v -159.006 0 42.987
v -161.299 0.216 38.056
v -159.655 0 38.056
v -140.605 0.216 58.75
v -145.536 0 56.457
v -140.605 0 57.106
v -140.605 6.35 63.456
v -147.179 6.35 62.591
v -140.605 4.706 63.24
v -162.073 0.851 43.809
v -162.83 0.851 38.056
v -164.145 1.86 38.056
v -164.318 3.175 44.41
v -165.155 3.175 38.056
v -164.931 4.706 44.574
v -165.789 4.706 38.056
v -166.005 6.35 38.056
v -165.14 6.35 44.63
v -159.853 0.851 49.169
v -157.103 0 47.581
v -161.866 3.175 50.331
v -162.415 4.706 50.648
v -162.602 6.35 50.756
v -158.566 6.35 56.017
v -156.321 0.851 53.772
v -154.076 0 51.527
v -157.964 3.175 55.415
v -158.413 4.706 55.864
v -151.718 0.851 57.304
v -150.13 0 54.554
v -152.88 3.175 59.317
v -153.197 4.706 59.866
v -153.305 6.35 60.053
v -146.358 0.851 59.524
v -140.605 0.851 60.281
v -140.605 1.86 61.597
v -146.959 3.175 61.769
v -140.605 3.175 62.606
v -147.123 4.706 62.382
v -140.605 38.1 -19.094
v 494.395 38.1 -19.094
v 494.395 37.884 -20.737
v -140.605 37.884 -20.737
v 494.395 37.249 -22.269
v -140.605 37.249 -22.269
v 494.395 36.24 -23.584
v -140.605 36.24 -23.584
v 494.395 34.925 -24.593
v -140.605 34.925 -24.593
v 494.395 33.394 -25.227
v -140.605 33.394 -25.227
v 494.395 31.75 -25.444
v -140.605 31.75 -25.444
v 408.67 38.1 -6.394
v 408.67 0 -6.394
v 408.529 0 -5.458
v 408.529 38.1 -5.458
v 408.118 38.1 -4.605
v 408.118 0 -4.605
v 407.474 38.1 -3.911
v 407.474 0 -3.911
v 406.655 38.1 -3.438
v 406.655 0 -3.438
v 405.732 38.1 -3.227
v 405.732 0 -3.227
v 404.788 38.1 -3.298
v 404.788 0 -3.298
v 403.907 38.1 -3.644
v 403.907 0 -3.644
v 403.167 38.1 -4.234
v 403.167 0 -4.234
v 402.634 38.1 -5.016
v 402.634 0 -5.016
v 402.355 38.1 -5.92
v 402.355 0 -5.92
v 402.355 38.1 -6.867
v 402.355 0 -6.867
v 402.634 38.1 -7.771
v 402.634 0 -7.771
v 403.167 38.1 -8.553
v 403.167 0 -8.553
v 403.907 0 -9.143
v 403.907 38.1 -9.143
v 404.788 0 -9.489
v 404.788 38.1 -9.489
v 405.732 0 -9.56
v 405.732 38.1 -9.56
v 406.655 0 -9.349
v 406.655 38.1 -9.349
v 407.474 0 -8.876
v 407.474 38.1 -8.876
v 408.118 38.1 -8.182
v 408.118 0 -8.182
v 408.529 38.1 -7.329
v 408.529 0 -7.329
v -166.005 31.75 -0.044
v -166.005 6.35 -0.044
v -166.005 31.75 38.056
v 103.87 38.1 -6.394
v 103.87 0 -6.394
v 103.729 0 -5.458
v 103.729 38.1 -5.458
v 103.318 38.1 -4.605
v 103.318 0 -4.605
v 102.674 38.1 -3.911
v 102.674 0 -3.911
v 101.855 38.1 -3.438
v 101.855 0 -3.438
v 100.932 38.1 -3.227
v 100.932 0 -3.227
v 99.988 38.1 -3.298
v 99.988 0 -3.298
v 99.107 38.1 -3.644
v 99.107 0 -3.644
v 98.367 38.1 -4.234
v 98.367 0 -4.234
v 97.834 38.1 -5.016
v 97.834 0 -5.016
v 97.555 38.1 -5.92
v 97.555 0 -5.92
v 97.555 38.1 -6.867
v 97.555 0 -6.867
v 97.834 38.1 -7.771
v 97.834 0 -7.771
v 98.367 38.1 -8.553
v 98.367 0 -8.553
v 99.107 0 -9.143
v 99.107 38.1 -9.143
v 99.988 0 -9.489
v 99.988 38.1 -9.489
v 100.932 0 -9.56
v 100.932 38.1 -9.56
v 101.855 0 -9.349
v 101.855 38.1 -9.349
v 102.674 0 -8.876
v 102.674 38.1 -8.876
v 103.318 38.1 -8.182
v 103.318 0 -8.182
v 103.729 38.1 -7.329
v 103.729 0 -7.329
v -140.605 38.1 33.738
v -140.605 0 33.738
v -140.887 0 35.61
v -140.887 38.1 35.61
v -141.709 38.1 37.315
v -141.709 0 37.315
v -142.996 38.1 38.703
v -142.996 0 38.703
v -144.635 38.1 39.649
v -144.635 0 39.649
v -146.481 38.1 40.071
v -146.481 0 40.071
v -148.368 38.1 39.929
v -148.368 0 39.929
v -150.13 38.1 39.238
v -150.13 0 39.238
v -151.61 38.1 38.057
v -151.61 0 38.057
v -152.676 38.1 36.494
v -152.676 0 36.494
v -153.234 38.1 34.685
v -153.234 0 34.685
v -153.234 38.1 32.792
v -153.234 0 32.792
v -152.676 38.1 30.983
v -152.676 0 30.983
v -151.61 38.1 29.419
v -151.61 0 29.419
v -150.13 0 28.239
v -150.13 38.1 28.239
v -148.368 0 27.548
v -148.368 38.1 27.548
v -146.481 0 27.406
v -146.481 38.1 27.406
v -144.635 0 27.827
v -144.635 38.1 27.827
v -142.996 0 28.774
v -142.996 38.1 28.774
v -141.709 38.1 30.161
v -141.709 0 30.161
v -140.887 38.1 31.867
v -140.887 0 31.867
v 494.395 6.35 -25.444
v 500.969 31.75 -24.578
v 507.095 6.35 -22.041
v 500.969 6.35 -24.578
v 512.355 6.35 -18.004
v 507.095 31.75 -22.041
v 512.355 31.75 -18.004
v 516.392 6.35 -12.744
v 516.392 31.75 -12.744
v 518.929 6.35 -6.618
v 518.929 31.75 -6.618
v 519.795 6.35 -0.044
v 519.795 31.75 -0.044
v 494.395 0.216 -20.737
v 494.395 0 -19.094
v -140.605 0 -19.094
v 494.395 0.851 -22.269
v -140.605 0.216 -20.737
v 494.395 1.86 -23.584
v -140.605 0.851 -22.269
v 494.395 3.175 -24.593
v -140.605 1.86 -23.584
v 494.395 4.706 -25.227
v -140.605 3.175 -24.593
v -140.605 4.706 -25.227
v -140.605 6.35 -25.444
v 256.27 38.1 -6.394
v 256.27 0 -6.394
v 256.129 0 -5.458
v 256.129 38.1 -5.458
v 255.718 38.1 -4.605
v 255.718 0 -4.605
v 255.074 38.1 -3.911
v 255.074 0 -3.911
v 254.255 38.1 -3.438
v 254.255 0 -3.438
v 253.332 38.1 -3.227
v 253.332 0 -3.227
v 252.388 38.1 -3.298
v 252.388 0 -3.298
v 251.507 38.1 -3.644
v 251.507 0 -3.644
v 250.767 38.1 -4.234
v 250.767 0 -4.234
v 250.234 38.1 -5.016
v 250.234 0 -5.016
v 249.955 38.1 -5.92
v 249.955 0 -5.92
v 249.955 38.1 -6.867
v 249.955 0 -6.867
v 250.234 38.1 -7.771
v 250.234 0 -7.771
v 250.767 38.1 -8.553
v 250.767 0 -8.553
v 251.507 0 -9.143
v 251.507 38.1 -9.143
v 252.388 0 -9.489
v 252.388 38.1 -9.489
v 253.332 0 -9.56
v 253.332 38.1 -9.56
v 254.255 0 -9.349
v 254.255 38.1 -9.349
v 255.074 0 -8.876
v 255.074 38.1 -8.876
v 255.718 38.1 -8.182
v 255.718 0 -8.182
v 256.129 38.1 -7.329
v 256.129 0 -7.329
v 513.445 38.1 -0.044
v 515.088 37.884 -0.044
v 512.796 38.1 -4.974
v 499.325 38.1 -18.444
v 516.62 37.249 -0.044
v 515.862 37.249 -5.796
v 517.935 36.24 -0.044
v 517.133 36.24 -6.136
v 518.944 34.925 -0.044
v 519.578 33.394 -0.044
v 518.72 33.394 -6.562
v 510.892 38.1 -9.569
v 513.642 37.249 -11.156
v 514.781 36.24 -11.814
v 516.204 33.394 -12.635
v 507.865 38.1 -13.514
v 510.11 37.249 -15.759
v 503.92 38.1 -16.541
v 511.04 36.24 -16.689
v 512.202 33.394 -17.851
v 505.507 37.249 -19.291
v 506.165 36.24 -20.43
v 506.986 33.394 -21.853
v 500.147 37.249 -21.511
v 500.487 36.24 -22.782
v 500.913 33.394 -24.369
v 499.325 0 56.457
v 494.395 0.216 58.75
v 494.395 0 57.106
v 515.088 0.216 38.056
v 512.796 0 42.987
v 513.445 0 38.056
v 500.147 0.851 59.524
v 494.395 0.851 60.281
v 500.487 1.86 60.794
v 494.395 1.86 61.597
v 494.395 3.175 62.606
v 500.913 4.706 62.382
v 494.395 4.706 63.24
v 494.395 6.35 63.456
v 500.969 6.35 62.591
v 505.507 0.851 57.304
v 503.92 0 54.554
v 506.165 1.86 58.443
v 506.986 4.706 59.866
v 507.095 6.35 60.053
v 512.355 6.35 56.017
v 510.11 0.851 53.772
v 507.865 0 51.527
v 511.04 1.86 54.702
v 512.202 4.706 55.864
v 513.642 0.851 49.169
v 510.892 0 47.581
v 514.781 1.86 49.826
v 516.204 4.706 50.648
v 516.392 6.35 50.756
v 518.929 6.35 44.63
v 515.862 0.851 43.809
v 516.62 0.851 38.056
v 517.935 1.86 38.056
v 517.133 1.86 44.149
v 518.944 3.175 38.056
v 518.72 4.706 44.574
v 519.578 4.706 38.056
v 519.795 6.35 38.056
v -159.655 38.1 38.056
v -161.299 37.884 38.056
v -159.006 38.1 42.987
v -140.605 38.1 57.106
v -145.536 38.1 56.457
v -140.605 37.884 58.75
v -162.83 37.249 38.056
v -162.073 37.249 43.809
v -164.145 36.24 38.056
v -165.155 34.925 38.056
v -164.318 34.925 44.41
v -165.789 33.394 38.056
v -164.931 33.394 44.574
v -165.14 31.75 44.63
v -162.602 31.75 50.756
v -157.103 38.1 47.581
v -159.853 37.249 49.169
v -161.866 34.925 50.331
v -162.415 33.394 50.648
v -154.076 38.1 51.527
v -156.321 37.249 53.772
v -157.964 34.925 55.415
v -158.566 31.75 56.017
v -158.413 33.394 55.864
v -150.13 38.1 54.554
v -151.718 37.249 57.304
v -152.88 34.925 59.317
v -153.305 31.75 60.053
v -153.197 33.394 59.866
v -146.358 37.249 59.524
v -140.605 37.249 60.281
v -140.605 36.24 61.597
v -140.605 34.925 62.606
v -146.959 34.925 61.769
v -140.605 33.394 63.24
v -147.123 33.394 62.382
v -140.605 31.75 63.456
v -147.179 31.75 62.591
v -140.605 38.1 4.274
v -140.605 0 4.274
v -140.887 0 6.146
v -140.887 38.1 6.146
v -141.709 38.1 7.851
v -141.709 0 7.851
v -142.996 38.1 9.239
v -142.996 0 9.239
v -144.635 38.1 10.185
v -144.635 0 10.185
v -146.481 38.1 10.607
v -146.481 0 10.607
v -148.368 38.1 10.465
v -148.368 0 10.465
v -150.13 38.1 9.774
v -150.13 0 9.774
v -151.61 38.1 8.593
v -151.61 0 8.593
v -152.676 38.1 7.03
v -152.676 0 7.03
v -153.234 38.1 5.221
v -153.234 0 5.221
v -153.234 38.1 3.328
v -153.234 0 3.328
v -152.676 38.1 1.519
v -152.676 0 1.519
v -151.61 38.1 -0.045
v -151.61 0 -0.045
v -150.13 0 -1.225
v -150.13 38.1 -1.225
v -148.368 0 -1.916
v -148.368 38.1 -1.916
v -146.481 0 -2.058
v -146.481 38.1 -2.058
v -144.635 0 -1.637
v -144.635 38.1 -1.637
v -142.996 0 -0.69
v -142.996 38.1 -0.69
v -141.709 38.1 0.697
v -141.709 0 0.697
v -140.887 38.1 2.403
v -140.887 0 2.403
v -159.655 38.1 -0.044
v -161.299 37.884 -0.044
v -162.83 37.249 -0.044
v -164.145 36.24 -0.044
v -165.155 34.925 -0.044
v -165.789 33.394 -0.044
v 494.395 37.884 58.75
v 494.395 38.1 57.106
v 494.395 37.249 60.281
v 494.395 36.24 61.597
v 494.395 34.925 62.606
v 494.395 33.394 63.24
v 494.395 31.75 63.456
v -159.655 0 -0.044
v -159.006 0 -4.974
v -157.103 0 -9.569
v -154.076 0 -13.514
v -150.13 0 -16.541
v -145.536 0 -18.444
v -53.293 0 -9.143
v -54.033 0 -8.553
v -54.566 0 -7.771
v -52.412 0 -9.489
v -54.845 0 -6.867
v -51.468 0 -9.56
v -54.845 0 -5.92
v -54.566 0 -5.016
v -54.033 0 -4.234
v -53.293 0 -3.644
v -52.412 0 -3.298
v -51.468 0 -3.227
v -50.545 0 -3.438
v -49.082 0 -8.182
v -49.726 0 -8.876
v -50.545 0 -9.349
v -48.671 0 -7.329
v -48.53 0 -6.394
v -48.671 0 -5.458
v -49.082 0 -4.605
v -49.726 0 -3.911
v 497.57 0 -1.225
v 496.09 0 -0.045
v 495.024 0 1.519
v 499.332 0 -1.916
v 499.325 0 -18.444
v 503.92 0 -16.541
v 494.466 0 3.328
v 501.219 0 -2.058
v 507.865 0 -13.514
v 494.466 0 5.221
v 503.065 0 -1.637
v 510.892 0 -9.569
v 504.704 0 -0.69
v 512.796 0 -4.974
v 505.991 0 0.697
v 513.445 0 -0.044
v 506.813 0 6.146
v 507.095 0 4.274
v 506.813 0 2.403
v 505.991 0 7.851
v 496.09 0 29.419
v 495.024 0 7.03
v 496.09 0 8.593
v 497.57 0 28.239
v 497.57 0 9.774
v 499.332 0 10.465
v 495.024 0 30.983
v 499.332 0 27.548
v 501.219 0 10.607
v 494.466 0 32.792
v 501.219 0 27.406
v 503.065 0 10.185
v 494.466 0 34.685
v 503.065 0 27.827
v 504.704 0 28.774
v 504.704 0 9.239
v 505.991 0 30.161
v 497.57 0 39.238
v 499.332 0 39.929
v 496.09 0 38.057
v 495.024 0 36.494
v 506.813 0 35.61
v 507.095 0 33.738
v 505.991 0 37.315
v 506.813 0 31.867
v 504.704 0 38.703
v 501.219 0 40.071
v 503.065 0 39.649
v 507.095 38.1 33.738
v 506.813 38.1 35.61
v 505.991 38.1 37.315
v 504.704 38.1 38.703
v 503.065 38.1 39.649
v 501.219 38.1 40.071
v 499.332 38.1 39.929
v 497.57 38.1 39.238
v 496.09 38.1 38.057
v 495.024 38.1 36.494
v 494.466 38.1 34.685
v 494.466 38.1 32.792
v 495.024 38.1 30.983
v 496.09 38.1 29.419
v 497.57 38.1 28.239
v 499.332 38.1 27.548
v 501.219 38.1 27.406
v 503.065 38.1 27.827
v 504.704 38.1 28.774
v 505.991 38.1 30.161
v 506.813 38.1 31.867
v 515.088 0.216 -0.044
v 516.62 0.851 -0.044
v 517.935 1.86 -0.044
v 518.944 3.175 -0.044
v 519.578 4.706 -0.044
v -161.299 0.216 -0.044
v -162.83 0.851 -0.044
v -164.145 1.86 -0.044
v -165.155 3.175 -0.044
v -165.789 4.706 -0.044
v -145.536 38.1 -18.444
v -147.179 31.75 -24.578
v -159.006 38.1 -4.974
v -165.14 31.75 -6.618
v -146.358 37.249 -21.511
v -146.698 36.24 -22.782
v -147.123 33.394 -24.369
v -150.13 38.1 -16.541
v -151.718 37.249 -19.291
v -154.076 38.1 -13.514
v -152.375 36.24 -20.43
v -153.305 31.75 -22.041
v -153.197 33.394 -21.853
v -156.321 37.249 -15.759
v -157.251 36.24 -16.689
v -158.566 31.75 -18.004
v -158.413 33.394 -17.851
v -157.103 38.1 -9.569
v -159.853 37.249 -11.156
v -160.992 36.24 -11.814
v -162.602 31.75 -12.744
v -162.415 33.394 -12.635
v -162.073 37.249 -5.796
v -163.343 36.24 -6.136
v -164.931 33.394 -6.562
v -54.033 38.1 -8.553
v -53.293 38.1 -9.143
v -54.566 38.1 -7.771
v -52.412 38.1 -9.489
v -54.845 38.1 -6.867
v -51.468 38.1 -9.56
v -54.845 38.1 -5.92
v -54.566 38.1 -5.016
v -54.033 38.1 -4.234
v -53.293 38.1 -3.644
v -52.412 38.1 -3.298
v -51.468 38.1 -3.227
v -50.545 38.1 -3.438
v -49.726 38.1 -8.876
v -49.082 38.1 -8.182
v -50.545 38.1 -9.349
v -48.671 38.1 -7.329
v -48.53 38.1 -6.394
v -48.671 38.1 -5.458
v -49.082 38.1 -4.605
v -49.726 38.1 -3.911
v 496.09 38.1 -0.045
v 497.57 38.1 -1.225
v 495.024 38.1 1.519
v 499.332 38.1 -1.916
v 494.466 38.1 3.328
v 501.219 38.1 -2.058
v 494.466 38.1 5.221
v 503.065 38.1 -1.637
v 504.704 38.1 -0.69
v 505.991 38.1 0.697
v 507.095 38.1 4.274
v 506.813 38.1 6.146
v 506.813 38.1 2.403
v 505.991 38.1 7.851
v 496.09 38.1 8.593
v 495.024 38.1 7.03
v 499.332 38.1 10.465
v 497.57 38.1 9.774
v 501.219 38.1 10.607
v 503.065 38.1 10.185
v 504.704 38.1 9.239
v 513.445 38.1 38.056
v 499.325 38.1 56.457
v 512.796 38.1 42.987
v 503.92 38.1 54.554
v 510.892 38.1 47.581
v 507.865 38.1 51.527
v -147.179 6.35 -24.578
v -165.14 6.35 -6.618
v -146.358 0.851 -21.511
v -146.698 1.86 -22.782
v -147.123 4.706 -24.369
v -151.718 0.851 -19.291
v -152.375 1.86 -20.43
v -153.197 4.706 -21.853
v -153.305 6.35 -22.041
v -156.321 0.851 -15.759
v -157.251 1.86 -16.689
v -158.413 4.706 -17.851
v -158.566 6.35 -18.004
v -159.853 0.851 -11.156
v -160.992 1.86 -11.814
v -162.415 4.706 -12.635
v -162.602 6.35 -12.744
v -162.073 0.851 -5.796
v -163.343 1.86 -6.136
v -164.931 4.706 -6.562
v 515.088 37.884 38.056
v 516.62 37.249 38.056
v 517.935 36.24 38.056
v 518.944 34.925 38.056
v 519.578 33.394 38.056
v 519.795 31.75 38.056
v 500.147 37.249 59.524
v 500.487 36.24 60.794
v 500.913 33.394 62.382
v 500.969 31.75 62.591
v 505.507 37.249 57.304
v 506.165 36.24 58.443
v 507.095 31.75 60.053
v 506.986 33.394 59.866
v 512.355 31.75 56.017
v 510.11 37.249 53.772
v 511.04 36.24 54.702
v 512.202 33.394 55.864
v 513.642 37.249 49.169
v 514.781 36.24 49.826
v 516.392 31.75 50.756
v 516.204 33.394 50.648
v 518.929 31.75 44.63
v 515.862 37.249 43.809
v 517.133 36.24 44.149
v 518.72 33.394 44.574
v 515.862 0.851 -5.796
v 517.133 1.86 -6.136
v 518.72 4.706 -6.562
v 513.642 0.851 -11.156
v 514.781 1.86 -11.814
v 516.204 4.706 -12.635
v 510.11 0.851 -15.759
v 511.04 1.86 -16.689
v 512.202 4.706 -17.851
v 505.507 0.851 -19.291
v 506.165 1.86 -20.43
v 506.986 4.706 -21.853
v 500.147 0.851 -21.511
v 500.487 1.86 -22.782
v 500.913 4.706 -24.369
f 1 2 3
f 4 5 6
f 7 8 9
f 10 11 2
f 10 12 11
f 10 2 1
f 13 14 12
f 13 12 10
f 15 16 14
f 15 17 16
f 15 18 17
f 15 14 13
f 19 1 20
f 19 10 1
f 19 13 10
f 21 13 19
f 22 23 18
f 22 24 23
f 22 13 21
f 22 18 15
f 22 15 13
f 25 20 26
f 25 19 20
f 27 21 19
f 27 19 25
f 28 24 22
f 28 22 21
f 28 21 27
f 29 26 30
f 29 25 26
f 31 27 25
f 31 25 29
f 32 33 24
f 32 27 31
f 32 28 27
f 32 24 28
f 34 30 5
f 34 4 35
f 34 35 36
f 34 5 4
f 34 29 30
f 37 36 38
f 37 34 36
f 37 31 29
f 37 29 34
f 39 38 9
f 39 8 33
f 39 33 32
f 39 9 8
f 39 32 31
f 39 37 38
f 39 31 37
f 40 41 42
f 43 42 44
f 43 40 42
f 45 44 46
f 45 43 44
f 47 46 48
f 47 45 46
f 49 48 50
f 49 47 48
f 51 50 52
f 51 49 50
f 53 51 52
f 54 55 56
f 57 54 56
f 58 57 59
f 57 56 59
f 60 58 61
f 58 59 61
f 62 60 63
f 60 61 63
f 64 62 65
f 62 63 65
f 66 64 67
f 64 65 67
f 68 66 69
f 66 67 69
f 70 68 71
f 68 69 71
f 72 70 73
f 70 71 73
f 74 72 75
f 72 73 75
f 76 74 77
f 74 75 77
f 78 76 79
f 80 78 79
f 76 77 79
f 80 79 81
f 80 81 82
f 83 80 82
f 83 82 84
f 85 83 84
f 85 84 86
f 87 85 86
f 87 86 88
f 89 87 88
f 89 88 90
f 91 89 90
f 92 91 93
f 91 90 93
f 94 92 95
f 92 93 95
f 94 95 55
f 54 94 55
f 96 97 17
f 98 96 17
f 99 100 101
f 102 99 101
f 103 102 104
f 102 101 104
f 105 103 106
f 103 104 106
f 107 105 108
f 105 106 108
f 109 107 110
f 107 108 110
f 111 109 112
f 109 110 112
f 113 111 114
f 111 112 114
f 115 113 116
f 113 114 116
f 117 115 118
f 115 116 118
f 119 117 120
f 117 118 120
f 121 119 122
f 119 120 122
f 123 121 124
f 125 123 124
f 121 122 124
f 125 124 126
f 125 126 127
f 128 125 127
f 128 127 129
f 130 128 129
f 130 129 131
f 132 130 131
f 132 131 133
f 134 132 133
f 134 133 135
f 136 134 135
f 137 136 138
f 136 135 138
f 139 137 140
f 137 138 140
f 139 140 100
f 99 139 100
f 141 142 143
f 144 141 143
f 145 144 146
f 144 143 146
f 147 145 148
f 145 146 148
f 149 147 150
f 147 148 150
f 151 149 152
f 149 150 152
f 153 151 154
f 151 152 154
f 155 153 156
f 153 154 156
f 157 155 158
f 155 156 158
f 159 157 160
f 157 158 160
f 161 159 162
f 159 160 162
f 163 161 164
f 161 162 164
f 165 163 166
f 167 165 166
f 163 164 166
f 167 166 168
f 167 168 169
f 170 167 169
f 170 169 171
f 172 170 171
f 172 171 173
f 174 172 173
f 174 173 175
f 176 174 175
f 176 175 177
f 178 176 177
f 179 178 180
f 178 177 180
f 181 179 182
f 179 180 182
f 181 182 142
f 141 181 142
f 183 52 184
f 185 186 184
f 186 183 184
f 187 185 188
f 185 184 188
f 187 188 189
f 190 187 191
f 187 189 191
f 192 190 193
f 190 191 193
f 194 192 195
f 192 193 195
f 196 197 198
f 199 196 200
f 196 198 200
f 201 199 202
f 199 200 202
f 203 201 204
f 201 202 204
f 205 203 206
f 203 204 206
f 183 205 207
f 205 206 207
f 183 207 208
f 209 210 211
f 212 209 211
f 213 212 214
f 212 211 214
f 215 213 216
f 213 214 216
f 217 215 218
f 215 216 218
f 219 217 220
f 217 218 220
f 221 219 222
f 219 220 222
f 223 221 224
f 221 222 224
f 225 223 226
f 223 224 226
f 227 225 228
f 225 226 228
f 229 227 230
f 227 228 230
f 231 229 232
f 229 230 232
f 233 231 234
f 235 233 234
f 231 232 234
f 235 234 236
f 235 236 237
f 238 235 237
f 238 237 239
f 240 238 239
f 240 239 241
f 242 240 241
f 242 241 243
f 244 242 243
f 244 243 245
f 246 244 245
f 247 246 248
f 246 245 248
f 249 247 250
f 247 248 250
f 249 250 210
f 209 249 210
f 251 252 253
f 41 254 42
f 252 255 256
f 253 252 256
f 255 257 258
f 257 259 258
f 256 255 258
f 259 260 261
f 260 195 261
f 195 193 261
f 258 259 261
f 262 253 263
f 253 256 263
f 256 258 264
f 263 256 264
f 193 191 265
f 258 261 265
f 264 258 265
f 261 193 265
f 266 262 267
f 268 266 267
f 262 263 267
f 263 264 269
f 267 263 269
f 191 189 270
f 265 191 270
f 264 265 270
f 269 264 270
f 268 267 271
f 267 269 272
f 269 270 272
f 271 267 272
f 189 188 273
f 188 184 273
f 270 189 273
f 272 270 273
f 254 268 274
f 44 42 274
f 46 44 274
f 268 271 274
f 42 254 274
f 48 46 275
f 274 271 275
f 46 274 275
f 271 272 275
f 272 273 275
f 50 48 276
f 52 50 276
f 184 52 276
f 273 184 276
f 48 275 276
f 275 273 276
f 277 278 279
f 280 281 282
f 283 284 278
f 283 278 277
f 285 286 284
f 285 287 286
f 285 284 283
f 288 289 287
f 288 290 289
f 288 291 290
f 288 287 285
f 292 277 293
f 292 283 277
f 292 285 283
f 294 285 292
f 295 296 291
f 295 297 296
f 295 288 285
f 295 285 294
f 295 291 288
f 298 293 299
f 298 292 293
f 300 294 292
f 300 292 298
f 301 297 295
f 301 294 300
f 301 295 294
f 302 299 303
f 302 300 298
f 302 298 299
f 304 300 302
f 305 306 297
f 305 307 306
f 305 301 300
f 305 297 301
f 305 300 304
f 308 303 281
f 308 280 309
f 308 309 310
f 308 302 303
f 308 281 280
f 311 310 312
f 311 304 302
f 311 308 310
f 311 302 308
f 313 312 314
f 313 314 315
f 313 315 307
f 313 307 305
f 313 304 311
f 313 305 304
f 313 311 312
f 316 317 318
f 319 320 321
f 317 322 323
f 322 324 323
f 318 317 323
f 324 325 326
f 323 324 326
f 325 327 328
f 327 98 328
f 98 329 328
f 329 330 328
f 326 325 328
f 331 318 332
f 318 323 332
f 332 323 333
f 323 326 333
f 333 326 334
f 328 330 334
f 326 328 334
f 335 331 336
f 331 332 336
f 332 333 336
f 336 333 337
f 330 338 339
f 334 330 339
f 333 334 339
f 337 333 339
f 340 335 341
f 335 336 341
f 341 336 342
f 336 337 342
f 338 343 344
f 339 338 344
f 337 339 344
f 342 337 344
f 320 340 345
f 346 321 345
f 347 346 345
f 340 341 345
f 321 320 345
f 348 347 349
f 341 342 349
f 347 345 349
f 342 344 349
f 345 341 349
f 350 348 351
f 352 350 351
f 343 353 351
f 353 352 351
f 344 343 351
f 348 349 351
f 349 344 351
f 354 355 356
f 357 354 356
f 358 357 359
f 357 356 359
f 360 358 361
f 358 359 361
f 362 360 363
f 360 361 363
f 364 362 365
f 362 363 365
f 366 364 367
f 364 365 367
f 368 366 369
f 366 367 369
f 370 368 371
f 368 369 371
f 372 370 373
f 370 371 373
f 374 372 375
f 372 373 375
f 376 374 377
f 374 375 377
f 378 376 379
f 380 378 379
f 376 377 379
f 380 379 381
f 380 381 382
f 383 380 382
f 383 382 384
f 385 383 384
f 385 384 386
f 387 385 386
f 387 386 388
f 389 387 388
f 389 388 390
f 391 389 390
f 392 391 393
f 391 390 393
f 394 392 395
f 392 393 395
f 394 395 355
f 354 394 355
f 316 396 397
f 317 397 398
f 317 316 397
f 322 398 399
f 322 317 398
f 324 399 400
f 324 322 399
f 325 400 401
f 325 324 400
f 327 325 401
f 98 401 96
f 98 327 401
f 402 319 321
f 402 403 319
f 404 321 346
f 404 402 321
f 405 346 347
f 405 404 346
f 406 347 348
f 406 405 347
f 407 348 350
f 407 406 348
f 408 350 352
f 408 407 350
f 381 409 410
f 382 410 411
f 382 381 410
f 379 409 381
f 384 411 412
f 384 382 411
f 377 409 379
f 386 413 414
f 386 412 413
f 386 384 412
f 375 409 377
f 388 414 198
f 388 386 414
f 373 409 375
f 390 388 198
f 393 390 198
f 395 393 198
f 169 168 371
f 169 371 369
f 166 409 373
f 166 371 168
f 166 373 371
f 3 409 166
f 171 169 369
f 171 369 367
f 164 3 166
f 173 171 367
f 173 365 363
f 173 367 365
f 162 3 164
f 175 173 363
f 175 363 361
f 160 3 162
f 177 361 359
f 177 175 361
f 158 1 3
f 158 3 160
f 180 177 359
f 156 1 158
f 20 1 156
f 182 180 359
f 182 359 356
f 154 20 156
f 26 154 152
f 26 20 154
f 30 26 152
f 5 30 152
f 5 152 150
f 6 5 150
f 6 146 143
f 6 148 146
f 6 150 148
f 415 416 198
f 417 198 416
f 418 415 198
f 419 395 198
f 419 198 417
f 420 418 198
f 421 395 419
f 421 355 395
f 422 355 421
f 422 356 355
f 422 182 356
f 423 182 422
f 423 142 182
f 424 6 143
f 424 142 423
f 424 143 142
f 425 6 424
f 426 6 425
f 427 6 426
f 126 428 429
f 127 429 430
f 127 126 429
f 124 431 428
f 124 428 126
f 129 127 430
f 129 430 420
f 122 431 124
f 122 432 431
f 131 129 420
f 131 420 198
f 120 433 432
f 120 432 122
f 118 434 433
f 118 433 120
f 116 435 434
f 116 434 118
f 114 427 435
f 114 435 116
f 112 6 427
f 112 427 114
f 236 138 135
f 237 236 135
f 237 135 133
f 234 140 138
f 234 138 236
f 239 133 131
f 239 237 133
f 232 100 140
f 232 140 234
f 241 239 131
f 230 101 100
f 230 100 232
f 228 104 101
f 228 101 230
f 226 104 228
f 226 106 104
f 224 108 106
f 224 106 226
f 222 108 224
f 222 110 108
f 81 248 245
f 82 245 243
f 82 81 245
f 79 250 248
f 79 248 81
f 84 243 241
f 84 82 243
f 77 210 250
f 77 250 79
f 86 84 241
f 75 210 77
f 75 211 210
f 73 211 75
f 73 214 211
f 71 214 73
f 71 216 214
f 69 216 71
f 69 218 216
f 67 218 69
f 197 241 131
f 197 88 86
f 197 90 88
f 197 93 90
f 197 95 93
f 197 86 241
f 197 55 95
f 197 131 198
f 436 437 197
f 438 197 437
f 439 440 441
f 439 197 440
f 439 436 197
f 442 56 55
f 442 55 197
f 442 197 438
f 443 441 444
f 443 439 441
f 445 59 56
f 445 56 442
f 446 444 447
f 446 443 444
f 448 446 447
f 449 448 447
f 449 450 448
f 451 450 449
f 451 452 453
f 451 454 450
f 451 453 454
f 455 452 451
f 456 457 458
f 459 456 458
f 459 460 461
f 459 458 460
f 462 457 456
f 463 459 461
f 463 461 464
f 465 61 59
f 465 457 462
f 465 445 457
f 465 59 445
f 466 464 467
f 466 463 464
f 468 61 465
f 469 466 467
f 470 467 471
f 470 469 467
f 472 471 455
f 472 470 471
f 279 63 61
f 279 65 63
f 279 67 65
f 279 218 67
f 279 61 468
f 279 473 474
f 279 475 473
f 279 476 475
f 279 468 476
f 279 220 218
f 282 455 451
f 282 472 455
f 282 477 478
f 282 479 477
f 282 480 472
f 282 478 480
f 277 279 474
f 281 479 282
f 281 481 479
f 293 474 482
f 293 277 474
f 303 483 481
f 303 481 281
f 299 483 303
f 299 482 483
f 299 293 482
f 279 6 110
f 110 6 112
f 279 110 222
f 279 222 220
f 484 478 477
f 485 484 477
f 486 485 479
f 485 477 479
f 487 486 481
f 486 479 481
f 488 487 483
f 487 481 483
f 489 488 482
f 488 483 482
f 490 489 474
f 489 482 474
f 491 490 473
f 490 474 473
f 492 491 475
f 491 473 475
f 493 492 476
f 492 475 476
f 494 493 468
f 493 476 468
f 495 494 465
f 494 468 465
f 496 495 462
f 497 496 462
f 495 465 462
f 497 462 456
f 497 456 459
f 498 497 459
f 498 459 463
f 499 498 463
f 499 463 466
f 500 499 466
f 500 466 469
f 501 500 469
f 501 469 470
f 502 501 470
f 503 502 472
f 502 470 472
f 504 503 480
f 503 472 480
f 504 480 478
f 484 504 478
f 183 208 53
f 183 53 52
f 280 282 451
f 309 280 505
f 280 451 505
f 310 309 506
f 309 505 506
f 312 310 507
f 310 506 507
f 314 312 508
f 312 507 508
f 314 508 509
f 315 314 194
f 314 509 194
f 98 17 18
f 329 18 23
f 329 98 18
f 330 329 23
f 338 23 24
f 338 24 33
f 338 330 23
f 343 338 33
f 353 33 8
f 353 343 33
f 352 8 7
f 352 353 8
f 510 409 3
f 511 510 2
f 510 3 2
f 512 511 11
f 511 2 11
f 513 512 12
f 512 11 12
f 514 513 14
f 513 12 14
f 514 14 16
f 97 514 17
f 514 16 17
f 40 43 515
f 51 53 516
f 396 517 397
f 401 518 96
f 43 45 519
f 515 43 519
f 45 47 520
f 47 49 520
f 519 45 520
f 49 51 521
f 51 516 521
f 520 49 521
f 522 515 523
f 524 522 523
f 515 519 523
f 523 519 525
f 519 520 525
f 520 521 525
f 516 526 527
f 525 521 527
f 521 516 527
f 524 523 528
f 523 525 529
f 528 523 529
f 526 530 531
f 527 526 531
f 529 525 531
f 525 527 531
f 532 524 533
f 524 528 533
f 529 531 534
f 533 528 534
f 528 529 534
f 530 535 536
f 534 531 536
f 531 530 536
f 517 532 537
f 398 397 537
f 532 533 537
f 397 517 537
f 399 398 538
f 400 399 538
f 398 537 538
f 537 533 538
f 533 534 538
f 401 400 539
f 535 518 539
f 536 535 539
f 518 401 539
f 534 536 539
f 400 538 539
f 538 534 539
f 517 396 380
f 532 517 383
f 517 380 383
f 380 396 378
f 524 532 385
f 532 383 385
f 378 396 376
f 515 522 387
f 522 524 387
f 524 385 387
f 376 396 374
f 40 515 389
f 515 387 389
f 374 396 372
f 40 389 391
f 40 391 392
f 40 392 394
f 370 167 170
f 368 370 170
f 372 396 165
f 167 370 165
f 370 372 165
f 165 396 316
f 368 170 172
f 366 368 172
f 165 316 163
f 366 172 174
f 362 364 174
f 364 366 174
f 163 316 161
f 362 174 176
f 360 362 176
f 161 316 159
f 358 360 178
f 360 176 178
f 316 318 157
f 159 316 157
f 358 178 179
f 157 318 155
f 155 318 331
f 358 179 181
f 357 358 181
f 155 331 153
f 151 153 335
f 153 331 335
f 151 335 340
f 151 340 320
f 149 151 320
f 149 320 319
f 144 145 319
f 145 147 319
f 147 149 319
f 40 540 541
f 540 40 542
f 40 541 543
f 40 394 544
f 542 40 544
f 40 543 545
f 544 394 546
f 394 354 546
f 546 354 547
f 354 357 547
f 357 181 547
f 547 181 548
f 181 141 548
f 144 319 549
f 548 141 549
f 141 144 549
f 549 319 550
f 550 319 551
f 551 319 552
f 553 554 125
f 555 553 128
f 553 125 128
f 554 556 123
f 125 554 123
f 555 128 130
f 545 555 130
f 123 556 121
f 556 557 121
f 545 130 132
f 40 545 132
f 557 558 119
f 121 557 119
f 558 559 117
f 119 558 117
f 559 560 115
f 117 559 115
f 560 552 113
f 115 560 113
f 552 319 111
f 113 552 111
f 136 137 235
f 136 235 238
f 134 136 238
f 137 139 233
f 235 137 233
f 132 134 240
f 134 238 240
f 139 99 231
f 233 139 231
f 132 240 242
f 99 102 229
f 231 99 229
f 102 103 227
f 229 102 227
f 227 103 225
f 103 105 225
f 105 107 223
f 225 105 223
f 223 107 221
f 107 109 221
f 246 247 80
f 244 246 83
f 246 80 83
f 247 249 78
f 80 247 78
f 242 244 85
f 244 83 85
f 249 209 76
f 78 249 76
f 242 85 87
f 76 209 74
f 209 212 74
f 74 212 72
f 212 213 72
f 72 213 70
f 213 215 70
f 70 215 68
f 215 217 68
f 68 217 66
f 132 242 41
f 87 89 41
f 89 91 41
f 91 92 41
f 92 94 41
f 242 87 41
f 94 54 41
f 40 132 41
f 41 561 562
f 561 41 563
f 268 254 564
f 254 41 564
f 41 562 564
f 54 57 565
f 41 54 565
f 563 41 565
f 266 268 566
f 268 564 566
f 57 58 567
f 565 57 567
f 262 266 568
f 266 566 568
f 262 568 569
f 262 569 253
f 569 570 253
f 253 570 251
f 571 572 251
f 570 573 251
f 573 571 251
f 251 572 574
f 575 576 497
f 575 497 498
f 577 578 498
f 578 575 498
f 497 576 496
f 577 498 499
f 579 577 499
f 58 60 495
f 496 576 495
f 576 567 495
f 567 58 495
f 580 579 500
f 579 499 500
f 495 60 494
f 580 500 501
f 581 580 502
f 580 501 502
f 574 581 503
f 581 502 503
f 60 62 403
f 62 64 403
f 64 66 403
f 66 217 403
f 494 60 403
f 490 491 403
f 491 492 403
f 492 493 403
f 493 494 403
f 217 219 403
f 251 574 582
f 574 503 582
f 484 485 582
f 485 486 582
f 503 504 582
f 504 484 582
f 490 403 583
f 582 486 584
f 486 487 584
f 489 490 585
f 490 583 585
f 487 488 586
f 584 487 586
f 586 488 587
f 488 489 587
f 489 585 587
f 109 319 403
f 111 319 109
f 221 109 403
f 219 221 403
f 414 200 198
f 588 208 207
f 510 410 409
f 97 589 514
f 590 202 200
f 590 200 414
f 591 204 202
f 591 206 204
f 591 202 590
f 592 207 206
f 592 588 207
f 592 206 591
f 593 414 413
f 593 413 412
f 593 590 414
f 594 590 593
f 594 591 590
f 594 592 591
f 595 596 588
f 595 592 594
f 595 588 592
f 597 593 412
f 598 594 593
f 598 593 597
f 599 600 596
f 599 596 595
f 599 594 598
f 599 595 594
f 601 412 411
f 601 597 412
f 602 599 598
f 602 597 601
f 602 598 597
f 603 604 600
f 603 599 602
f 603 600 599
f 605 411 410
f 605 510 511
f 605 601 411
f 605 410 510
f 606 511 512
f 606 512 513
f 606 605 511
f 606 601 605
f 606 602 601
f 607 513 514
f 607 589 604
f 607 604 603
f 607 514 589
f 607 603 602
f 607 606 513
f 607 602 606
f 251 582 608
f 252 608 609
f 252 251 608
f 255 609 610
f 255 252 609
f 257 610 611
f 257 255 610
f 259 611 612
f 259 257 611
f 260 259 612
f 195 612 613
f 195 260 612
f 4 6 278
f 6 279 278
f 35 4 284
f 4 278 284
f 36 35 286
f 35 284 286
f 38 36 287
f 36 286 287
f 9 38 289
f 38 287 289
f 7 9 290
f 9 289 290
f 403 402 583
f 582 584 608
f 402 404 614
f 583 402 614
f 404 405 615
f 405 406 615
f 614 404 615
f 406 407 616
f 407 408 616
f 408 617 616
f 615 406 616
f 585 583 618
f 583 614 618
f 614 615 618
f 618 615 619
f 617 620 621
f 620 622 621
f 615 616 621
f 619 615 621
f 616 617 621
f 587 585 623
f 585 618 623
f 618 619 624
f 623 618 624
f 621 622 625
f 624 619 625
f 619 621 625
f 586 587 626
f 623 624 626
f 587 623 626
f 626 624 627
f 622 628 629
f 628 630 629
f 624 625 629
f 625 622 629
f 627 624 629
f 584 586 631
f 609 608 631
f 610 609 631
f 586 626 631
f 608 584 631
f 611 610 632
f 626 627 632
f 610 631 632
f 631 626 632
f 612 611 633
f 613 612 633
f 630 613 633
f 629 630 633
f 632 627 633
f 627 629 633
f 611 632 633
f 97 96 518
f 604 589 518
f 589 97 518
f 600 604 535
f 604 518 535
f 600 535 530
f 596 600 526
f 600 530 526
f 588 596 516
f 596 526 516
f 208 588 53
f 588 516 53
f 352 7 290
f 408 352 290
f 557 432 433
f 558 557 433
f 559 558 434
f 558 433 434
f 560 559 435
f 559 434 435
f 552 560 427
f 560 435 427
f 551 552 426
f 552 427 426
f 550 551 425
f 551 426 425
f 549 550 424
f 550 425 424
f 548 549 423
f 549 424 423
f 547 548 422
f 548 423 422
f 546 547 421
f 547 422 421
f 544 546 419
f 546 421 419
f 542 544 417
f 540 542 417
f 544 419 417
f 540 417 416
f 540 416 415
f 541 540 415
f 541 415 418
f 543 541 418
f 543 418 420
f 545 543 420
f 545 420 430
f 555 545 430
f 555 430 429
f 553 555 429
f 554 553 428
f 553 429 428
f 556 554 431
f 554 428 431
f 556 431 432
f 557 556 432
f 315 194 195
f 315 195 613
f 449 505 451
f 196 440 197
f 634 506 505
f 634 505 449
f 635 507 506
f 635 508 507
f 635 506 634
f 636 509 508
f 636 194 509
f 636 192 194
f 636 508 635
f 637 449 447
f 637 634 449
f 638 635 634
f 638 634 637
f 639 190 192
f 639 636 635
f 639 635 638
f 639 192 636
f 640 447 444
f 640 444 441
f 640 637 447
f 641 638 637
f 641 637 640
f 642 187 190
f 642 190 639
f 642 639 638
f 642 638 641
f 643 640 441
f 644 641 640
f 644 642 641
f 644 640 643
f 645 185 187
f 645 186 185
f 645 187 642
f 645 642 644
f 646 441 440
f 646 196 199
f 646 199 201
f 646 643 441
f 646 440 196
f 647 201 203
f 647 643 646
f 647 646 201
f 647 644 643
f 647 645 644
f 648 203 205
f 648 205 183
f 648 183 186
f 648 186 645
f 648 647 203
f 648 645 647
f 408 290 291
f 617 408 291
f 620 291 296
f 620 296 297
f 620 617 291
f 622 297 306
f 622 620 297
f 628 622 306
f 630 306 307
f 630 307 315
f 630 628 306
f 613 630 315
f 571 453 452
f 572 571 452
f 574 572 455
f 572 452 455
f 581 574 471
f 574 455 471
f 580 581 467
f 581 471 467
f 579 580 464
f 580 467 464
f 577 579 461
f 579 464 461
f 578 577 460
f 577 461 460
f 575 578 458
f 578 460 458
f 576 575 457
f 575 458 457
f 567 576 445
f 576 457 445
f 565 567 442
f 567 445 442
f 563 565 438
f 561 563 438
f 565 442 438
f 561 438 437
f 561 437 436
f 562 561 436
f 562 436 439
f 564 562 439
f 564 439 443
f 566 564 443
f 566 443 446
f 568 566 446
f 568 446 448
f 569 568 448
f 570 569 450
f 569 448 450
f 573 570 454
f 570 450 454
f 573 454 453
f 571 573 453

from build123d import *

# Parameters (mm, degrees)
F0_W     = 685.8
F0_H     = 88.9
F0_R     = 3.175
F0_R_2   = 6.35
F1_DEPTH = 38.1
F2_R     = 25.4
F3_R     = 6.35


with BuildPart() as f1:
    # F0 (on Front) → F1 (new body)
    with BuildSketch(Plane.XZ):
        with Locations((176.894678, 19.006401)):
            Rectangle(F0_W, F0_H)
        with Locations((-51.705322, -6.393599)):
            Circle(F0_R, mode=Mode.SUBTRACT)
        with Locations((100.694678, -6.393599)):
            Circle(F0_R, mode=Mode.SUBTRACT)
        with Locations((-146.955322, 4.274401)):
            Circle(F0_R_2, mode=Mode.SUBTRACT)
        with Locations((253.094678, -6.393599)):
            Circle(F0_R, mode=Mode.SUBTRACT)
        with Locations((405.494678, -6.393599)):
            Circle(F0_R, mode=Mode.SUBTRACT)
        with Locations((500.744678, 4.274401)):
            Circle(F0_R_2, mode=Mode.SUBTRACT)
        with Locations((-146.955322, 33.738401)):
            Circle(F0_R_2, mode=Mode.SUBTRACT)
        with Locations((500.744678, 33.738401)):
            Circle(F0_R_2, mode=Mode.SUBTRACT)
    extrude(amount=-F1_DEPTH)

    # F2
    f2_edges = [f1.edges().sort_by_distance(p)[0] for p in [
        (519.794678, 19.05, 63.456401),
        (519.794678, 19.05, -25.443599),
        (-166.005322, 19.05, 63.456401),
        (-166.005322, 19.05, -25.443599),
    ]]
    fillet(f2_edges, radius=F2_R)

    # F3
    f3_edges = [f1.edges().sort_by_distance(p)[0] for p in [
        (176.894678, 0, 63.456401),
        (176.894678, 38.1, 63.456401),
    ]]
    fillet(f3_edges, radius=F3_R)


solid = f1.part
